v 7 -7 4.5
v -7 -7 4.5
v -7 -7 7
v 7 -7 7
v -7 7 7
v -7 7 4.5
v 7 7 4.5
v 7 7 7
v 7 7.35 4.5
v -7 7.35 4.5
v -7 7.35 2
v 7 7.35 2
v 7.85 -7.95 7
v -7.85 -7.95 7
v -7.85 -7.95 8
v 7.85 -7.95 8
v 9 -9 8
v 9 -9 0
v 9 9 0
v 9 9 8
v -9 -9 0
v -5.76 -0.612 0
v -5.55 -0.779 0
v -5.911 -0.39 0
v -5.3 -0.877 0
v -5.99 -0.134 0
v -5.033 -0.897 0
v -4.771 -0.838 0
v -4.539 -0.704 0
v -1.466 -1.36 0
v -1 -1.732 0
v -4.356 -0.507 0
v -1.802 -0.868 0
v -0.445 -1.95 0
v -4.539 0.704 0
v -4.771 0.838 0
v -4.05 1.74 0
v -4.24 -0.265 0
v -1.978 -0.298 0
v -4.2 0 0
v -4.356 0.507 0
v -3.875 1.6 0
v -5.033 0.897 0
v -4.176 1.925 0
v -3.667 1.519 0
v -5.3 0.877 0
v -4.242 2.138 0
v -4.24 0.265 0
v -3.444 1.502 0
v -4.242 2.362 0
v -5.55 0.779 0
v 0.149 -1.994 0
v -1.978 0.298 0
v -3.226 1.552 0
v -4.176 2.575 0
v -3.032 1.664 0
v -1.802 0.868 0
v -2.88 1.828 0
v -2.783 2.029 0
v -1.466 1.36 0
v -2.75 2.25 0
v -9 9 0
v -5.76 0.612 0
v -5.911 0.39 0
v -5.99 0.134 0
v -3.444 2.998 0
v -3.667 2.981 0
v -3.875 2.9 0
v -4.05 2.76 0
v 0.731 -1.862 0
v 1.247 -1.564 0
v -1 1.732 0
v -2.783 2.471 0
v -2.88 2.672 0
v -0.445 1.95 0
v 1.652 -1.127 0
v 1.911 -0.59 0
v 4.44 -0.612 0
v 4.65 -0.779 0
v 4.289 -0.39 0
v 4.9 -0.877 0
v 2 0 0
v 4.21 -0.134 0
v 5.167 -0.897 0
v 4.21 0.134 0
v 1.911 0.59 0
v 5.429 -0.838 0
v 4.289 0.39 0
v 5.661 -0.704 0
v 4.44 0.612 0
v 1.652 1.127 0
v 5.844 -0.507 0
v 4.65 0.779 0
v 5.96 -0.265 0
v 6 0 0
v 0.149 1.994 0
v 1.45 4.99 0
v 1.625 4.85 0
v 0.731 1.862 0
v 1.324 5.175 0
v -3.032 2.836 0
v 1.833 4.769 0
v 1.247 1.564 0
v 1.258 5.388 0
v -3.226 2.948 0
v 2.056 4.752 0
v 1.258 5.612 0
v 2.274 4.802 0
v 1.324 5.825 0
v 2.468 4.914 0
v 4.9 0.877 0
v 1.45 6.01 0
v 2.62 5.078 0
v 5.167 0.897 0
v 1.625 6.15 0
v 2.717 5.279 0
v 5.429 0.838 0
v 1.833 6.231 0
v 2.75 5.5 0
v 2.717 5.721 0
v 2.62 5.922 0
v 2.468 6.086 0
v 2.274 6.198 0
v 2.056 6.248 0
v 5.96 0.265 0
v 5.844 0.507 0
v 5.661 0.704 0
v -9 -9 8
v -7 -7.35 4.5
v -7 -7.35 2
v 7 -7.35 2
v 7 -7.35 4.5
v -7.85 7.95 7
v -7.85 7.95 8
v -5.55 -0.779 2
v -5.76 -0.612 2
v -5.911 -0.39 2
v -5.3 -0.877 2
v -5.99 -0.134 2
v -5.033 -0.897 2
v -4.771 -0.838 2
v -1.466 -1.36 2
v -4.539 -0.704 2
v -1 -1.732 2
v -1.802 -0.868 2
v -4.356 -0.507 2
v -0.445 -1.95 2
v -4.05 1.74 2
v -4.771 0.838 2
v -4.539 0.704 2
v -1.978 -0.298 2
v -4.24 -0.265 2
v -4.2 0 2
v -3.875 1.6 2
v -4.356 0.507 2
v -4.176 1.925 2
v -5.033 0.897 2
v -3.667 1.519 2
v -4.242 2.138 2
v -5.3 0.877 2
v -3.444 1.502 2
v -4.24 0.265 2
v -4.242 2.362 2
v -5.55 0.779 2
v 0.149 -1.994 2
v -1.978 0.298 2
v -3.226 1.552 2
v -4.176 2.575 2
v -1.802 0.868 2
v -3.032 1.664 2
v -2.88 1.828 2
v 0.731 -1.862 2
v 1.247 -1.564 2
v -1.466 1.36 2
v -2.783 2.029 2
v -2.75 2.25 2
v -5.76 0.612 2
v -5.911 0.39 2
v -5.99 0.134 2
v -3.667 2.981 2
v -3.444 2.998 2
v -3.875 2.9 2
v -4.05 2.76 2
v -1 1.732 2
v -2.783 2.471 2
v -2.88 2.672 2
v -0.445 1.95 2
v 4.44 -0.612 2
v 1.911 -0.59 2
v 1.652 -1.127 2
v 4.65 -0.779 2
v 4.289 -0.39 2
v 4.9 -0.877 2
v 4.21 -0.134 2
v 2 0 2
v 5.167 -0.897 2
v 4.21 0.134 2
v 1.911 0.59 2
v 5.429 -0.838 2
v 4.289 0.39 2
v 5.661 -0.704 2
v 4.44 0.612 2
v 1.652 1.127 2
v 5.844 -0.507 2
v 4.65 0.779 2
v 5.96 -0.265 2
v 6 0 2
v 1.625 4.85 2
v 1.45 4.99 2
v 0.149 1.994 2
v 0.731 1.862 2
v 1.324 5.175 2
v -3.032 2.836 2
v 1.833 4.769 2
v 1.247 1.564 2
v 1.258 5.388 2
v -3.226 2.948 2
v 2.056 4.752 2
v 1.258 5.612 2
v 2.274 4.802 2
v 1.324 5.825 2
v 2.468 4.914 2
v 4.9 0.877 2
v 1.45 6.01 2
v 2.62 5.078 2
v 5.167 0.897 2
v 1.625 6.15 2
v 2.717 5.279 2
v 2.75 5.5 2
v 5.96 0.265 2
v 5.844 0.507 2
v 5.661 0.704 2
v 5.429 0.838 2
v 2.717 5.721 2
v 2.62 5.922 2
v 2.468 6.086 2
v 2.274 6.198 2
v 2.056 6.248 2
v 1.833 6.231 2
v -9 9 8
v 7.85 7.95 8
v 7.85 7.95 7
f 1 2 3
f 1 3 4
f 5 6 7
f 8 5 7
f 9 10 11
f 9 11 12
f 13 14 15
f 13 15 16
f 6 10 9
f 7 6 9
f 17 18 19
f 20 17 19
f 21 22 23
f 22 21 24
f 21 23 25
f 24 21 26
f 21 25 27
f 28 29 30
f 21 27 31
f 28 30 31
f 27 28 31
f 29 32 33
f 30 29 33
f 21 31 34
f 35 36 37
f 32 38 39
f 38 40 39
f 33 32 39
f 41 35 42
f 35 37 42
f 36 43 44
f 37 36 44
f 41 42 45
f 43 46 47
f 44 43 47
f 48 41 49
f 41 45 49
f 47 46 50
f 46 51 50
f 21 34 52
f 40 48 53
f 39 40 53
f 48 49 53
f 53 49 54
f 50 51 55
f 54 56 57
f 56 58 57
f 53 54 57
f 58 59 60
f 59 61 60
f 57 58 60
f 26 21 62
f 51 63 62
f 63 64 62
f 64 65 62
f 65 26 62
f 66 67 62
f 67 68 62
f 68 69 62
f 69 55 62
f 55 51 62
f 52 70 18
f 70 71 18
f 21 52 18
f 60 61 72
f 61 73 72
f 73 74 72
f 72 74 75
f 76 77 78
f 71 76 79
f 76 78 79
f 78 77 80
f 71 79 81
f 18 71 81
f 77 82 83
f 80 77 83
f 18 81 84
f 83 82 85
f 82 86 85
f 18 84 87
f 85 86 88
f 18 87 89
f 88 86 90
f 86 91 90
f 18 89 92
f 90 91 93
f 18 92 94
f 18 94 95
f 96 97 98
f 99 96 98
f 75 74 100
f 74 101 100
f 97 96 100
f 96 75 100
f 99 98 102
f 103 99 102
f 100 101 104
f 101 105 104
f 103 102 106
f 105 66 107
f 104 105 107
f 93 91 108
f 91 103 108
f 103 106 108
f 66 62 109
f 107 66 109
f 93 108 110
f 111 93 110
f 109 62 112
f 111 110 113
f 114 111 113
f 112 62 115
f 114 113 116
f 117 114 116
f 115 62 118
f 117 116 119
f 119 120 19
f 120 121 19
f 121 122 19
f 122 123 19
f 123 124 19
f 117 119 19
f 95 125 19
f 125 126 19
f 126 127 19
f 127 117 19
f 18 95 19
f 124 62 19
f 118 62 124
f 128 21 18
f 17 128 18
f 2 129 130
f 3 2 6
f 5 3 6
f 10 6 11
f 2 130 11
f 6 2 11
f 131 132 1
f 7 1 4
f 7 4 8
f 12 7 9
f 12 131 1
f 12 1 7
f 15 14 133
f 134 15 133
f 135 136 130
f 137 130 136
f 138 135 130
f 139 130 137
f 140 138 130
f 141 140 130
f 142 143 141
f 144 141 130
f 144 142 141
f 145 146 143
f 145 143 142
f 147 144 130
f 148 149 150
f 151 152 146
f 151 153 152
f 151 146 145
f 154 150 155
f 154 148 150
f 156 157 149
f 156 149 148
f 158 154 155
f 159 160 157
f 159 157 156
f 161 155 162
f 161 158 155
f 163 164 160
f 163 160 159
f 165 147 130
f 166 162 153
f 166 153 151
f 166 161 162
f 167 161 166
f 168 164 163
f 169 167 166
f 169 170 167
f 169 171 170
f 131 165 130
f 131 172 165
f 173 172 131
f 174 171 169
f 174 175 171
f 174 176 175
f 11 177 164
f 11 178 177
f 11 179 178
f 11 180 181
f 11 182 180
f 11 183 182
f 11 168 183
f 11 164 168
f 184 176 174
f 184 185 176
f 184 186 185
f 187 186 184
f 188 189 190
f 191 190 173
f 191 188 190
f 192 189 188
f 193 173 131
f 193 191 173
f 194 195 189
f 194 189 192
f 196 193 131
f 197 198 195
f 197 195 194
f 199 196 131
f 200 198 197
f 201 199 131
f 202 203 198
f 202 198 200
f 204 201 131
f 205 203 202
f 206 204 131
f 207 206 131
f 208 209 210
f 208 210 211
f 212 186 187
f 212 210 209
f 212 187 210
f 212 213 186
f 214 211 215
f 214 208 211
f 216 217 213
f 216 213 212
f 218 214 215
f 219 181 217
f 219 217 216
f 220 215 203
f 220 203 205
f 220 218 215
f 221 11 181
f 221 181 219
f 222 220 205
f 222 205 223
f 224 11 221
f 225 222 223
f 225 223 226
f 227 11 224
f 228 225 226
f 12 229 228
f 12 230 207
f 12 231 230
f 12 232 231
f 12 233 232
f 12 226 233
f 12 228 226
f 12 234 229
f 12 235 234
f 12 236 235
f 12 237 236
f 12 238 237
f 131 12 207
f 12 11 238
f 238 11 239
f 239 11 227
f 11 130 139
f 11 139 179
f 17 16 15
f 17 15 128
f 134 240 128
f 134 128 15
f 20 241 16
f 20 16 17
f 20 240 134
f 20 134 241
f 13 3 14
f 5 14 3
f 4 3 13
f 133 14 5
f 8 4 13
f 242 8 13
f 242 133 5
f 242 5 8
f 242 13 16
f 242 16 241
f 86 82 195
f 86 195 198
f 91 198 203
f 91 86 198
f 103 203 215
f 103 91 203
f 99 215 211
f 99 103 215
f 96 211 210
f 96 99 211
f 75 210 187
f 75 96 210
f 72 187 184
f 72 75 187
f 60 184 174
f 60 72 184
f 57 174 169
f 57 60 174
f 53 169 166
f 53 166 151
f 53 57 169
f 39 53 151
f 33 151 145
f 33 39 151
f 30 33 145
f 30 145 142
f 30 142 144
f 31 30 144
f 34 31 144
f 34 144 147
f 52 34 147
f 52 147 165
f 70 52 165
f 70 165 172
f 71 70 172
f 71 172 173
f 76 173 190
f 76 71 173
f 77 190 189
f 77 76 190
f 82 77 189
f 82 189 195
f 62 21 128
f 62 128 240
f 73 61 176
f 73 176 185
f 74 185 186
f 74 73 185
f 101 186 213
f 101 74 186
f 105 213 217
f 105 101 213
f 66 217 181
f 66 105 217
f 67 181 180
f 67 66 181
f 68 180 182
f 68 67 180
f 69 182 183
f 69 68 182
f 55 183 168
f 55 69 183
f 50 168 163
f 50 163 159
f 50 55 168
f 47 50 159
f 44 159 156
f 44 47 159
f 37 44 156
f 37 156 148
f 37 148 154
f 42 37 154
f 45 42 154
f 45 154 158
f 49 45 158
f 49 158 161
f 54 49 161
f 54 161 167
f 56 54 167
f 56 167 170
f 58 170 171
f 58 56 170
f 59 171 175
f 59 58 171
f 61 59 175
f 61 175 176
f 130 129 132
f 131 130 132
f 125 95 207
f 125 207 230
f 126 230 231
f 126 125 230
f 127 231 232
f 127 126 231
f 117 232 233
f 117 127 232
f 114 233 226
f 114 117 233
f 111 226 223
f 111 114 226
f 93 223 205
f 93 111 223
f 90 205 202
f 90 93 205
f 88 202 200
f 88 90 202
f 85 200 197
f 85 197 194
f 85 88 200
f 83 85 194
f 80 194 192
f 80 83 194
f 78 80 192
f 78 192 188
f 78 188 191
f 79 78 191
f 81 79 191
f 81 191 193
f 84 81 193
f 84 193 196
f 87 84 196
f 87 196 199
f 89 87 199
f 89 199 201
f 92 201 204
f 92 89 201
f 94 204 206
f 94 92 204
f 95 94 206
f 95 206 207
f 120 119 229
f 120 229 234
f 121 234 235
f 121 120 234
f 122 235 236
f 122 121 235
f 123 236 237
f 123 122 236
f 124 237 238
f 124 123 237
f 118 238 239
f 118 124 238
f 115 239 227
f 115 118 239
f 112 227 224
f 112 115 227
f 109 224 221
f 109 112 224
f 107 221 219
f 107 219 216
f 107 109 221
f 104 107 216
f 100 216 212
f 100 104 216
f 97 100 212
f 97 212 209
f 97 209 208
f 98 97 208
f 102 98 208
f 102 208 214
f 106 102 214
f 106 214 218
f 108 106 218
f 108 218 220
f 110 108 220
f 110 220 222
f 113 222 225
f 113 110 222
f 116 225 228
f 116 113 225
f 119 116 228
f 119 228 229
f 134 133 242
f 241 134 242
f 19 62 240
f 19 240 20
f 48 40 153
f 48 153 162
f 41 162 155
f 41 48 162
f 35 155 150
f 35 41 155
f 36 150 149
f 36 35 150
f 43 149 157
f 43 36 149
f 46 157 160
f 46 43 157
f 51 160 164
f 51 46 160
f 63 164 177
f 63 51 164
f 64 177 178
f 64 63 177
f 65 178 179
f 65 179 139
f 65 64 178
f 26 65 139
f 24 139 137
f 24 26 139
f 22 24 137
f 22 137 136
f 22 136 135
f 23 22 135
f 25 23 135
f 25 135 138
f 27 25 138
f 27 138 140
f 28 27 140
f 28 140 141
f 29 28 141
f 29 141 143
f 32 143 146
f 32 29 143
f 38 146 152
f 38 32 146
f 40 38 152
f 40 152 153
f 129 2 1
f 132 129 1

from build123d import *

# Parameters (mm, degrees)
F0_W     = 14
F0_H     = 14
F0_R     = 0.9
F0_R_2   = 0.75
F0_R_3   = 2
F1_DEPTH = 2
F0_W_2   = 15.7
F0_H_2   = 15.9
F3_DEPTH = 7
F0_W_3   = 18
F0_H_3   = 18
F4_DEPTH = 8
F5_W     = 14
F5_H     = 14.7
F6_DEPTH = 2.5


with BuildPart() as f1:
    # F0 (on Top) → F1 (new body)
    with BuildSketch(Plane.XY):
        Rectangle(F0_W, F0_H)
        with Locations((-5.1, 0)):
            Circle(F0_R, mode=Mode.SUBTRACT)
        with Locations((-3.5, 2.25)):
            Circle(F0_R_2, mode=Mode.SUBTRACT)
        Circle(F0_R_3, mode=Mode.SUBTRACT)
        with Locations((5.1, 0)):
            Circle(F0_R, mode=Mode.SUBTRACT)
        with Locations((2, 5.5)):
            Circle(F0_R_2, mode=Mode.SUBTRACT)
    extrude(amount=F1_DEPTH)

    # F0 (on Top) → F3 (join)
    with BuildSketch(Plane.XY):
        Rectangle(F0_W_2, F0_H_2)
        Rectangle(F0_W, F0_H, mode=Mode.SUBTRACT)
    extrude(amount=F3_DEPTH)

    # F0 (on Top) → F4 (join)
    with BuildSketch(Plane.XY):
        Rectangle(F0_W_3, F0_H_3)
        Rectangle(F0_W_2, F0_H_2, mode=Mode.SUBTRACT)
    extrude(amount=F4_DEPTH)

    # F5 (on offset) → F6 (cut, through all)
    with BuildSketch(Plane.XY.offset(4.5)):
        Rectangle(F5_W, F5_H)
    extrude(amount=-F6_DEPTH, mode=Mode.SUBTRACT)


solid = f1.part
